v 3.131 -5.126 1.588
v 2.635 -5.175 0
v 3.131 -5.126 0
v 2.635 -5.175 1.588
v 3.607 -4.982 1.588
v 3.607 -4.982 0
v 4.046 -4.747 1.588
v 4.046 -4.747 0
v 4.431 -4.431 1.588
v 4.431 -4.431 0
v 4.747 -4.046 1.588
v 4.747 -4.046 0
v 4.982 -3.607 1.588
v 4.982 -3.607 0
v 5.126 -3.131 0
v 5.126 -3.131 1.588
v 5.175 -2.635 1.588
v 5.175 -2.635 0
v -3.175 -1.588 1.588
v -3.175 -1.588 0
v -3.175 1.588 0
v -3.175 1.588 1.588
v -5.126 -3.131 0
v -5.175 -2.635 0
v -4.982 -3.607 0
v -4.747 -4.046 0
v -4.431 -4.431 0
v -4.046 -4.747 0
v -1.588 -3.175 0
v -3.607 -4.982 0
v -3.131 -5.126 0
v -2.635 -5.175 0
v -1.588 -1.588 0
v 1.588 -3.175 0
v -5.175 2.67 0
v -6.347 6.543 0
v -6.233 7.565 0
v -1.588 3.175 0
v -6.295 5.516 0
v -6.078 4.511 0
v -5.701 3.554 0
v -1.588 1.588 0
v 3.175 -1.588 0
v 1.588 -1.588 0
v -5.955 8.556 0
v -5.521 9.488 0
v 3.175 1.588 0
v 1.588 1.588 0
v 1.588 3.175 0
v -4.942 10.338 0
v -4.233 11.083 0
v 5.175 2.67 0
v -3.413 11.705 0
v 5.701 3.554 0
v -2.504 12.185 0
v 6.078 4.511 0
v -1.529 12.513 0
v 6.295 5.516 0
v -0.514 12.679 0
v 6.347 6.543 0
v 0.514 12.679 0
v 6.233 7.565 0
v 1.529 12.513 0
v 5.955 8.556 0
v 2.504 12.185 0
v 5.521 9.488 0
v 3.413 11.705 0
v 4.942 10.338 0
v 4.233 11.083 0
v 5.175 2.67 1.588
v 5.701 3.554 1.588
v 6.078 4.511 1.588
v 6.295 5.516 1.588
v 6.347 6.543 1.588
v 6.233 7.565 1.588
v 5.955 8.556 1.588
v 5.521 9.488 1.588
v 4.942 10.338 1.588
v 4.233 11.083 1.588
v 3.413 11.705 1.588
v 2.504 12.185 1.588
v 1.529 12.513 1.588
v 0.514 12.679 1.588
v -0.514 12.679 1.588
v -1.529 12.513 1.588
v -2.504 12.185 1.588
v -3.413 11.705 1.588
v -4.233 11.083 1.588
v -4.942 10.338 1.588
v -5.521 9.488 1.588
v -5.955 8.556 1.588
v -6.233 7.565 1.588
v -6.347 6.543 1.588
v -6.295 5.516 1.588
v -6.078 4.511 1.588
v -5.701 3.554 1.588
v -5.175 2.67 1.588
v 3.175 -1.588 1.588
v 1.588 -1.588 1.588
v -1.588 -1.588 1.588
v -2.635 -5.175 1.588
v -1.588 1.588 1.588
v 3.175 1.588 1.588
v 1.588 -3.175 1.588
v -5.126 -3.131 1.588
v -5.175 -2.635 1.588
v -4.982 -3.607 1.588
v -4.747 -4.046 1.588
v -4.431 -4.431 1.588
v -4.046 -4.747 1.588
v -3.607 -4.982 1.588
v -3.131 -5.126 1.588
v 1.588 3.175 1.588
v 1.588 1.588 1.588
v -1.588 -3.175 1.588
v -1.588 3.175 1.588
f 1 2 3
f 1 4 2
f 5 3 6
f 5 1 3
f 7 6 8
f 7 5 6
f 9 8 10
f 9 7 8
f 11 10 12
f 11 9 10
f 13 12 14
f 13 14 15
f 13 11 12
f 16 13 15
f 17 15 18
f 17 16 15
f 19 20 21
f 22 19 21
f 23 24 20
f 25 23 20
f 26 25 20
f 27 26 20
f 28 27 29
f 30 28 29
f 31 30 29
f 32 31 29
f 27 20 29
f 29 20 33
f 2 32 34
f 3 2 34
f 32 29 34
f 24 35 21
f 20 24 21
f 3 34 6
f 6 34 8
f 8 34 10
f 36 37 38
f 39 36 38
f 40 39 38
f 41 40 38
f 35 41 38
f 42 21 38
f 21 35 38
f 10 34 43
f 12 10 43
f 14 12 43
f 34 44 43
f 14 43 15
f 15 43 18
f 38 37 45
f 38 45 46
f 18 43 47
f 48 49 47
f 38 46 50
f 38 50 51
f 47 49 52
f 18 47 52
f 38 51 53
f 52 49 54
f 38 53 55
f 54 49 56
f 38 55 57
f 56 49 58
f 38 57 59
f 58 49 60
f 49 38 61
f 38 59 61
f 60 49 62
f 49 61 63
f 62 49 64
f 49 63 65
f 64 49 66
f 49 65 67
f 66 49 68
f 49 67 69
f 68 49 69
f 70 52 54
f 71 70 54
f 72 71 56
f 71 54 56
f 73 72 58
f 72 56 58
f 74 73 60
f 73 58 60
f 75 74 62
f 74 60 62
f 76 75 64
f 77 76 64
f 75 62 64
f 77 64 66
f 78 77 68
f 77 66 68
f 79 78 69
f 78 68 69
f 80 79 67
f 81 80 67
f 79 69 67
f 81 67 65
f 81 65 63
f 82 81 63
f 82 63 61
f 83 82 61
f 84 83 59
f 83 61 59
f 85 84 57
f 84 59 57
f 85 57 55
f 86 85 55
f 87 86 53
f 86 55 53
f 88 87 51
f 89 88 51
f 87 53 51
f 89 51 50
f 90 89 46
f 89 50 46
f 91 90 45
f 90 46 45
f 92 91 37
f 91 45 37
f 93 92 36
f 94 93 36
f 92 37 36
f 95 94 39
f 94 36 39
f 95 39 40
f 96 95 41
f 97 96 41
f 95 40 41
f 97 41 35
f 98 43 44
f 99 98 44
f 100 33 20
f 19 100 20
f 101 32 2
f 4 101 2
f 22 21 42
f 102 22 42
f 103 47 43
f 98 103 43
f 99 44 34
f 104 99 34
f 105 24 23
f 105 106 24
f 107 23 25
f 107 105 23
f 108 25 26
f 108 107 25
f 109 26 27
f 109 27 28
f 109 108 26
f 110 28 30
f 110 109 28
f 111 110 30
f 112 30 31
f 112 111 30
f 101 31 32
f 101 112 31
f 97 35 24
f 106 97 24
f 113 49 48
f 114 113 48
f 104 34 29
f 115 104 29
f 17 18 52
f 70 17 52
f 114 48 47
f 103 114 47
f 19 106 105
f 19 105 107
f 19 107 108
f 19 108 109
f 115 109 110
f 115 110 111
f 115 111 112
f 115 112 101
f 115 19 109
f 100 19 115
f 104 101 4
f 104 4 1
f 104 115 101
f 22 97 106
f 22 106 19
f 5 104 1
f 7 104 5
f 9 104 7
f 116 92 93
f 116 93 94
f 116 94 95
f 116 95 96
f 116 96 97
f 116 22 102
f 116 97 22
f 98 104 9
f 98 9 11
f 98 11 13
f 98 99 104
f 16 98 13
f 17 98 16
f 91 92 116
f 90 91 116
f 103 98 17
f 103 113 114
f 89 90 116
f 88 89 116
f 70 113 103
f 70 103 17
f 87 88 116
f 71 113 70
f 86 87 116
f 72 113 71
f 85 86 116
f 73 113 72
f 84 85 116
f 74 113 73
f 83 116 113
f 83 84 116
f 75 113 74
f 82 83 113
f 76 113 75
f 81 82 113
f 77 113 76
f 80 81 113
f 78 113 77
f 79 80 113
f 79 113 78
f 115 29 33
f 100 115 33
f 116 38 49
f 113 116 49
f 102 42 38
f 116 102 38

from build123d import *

# Parameters (mm, degrees)
BOSS_EXTRUDE1_DEPTH = 1.5875
FILLET1_R           = 2.54


with BuildPart() as part:
    # Sketch1 → Boss-Extrude1 (new body)
    with BuildSketch(Plane.XY):
        with BuildLine():
            Line((-5.175, 2.670071332), (-5.175, -5.175))
            Line((-5.175, -5.175), (5.175, -5.175))
            Line((5.175, -5.175), (5.175, 2.670071332))
            ThreePointArc((5.175, 2.670071332), (0, 12.7), (-5.175, 2.670071332))
        make_face()
        Polygon((-3.175, -1.5875), (-3.175, 1.5875), (-1.5875, 1.5875), (-1.5875, 3.175), (1.5875, 3.175), (1.5875, 1.5875), (3.175, 1.5875), (3.175, -1.5875), (1.5875, -1.5875), (1.5875, -3.175), (-1.5875, -3.175), (-1.5875, -1.5875), align=None, mode=Mode.SUBTRACT)
    extrude(amount=BOSS_EXTRUDE1_DEPTH)

    # Fillet1
    fillet1_edges = [part.edges().sort_by_distance(p)[0] for p in [
        (5.175, -5.175, 0.79375),
        (-5.175, -5.175, 0.79375),
    ]]
    fillet(fillet1_edges, radius=FILLET1_R)


solid = part.part
